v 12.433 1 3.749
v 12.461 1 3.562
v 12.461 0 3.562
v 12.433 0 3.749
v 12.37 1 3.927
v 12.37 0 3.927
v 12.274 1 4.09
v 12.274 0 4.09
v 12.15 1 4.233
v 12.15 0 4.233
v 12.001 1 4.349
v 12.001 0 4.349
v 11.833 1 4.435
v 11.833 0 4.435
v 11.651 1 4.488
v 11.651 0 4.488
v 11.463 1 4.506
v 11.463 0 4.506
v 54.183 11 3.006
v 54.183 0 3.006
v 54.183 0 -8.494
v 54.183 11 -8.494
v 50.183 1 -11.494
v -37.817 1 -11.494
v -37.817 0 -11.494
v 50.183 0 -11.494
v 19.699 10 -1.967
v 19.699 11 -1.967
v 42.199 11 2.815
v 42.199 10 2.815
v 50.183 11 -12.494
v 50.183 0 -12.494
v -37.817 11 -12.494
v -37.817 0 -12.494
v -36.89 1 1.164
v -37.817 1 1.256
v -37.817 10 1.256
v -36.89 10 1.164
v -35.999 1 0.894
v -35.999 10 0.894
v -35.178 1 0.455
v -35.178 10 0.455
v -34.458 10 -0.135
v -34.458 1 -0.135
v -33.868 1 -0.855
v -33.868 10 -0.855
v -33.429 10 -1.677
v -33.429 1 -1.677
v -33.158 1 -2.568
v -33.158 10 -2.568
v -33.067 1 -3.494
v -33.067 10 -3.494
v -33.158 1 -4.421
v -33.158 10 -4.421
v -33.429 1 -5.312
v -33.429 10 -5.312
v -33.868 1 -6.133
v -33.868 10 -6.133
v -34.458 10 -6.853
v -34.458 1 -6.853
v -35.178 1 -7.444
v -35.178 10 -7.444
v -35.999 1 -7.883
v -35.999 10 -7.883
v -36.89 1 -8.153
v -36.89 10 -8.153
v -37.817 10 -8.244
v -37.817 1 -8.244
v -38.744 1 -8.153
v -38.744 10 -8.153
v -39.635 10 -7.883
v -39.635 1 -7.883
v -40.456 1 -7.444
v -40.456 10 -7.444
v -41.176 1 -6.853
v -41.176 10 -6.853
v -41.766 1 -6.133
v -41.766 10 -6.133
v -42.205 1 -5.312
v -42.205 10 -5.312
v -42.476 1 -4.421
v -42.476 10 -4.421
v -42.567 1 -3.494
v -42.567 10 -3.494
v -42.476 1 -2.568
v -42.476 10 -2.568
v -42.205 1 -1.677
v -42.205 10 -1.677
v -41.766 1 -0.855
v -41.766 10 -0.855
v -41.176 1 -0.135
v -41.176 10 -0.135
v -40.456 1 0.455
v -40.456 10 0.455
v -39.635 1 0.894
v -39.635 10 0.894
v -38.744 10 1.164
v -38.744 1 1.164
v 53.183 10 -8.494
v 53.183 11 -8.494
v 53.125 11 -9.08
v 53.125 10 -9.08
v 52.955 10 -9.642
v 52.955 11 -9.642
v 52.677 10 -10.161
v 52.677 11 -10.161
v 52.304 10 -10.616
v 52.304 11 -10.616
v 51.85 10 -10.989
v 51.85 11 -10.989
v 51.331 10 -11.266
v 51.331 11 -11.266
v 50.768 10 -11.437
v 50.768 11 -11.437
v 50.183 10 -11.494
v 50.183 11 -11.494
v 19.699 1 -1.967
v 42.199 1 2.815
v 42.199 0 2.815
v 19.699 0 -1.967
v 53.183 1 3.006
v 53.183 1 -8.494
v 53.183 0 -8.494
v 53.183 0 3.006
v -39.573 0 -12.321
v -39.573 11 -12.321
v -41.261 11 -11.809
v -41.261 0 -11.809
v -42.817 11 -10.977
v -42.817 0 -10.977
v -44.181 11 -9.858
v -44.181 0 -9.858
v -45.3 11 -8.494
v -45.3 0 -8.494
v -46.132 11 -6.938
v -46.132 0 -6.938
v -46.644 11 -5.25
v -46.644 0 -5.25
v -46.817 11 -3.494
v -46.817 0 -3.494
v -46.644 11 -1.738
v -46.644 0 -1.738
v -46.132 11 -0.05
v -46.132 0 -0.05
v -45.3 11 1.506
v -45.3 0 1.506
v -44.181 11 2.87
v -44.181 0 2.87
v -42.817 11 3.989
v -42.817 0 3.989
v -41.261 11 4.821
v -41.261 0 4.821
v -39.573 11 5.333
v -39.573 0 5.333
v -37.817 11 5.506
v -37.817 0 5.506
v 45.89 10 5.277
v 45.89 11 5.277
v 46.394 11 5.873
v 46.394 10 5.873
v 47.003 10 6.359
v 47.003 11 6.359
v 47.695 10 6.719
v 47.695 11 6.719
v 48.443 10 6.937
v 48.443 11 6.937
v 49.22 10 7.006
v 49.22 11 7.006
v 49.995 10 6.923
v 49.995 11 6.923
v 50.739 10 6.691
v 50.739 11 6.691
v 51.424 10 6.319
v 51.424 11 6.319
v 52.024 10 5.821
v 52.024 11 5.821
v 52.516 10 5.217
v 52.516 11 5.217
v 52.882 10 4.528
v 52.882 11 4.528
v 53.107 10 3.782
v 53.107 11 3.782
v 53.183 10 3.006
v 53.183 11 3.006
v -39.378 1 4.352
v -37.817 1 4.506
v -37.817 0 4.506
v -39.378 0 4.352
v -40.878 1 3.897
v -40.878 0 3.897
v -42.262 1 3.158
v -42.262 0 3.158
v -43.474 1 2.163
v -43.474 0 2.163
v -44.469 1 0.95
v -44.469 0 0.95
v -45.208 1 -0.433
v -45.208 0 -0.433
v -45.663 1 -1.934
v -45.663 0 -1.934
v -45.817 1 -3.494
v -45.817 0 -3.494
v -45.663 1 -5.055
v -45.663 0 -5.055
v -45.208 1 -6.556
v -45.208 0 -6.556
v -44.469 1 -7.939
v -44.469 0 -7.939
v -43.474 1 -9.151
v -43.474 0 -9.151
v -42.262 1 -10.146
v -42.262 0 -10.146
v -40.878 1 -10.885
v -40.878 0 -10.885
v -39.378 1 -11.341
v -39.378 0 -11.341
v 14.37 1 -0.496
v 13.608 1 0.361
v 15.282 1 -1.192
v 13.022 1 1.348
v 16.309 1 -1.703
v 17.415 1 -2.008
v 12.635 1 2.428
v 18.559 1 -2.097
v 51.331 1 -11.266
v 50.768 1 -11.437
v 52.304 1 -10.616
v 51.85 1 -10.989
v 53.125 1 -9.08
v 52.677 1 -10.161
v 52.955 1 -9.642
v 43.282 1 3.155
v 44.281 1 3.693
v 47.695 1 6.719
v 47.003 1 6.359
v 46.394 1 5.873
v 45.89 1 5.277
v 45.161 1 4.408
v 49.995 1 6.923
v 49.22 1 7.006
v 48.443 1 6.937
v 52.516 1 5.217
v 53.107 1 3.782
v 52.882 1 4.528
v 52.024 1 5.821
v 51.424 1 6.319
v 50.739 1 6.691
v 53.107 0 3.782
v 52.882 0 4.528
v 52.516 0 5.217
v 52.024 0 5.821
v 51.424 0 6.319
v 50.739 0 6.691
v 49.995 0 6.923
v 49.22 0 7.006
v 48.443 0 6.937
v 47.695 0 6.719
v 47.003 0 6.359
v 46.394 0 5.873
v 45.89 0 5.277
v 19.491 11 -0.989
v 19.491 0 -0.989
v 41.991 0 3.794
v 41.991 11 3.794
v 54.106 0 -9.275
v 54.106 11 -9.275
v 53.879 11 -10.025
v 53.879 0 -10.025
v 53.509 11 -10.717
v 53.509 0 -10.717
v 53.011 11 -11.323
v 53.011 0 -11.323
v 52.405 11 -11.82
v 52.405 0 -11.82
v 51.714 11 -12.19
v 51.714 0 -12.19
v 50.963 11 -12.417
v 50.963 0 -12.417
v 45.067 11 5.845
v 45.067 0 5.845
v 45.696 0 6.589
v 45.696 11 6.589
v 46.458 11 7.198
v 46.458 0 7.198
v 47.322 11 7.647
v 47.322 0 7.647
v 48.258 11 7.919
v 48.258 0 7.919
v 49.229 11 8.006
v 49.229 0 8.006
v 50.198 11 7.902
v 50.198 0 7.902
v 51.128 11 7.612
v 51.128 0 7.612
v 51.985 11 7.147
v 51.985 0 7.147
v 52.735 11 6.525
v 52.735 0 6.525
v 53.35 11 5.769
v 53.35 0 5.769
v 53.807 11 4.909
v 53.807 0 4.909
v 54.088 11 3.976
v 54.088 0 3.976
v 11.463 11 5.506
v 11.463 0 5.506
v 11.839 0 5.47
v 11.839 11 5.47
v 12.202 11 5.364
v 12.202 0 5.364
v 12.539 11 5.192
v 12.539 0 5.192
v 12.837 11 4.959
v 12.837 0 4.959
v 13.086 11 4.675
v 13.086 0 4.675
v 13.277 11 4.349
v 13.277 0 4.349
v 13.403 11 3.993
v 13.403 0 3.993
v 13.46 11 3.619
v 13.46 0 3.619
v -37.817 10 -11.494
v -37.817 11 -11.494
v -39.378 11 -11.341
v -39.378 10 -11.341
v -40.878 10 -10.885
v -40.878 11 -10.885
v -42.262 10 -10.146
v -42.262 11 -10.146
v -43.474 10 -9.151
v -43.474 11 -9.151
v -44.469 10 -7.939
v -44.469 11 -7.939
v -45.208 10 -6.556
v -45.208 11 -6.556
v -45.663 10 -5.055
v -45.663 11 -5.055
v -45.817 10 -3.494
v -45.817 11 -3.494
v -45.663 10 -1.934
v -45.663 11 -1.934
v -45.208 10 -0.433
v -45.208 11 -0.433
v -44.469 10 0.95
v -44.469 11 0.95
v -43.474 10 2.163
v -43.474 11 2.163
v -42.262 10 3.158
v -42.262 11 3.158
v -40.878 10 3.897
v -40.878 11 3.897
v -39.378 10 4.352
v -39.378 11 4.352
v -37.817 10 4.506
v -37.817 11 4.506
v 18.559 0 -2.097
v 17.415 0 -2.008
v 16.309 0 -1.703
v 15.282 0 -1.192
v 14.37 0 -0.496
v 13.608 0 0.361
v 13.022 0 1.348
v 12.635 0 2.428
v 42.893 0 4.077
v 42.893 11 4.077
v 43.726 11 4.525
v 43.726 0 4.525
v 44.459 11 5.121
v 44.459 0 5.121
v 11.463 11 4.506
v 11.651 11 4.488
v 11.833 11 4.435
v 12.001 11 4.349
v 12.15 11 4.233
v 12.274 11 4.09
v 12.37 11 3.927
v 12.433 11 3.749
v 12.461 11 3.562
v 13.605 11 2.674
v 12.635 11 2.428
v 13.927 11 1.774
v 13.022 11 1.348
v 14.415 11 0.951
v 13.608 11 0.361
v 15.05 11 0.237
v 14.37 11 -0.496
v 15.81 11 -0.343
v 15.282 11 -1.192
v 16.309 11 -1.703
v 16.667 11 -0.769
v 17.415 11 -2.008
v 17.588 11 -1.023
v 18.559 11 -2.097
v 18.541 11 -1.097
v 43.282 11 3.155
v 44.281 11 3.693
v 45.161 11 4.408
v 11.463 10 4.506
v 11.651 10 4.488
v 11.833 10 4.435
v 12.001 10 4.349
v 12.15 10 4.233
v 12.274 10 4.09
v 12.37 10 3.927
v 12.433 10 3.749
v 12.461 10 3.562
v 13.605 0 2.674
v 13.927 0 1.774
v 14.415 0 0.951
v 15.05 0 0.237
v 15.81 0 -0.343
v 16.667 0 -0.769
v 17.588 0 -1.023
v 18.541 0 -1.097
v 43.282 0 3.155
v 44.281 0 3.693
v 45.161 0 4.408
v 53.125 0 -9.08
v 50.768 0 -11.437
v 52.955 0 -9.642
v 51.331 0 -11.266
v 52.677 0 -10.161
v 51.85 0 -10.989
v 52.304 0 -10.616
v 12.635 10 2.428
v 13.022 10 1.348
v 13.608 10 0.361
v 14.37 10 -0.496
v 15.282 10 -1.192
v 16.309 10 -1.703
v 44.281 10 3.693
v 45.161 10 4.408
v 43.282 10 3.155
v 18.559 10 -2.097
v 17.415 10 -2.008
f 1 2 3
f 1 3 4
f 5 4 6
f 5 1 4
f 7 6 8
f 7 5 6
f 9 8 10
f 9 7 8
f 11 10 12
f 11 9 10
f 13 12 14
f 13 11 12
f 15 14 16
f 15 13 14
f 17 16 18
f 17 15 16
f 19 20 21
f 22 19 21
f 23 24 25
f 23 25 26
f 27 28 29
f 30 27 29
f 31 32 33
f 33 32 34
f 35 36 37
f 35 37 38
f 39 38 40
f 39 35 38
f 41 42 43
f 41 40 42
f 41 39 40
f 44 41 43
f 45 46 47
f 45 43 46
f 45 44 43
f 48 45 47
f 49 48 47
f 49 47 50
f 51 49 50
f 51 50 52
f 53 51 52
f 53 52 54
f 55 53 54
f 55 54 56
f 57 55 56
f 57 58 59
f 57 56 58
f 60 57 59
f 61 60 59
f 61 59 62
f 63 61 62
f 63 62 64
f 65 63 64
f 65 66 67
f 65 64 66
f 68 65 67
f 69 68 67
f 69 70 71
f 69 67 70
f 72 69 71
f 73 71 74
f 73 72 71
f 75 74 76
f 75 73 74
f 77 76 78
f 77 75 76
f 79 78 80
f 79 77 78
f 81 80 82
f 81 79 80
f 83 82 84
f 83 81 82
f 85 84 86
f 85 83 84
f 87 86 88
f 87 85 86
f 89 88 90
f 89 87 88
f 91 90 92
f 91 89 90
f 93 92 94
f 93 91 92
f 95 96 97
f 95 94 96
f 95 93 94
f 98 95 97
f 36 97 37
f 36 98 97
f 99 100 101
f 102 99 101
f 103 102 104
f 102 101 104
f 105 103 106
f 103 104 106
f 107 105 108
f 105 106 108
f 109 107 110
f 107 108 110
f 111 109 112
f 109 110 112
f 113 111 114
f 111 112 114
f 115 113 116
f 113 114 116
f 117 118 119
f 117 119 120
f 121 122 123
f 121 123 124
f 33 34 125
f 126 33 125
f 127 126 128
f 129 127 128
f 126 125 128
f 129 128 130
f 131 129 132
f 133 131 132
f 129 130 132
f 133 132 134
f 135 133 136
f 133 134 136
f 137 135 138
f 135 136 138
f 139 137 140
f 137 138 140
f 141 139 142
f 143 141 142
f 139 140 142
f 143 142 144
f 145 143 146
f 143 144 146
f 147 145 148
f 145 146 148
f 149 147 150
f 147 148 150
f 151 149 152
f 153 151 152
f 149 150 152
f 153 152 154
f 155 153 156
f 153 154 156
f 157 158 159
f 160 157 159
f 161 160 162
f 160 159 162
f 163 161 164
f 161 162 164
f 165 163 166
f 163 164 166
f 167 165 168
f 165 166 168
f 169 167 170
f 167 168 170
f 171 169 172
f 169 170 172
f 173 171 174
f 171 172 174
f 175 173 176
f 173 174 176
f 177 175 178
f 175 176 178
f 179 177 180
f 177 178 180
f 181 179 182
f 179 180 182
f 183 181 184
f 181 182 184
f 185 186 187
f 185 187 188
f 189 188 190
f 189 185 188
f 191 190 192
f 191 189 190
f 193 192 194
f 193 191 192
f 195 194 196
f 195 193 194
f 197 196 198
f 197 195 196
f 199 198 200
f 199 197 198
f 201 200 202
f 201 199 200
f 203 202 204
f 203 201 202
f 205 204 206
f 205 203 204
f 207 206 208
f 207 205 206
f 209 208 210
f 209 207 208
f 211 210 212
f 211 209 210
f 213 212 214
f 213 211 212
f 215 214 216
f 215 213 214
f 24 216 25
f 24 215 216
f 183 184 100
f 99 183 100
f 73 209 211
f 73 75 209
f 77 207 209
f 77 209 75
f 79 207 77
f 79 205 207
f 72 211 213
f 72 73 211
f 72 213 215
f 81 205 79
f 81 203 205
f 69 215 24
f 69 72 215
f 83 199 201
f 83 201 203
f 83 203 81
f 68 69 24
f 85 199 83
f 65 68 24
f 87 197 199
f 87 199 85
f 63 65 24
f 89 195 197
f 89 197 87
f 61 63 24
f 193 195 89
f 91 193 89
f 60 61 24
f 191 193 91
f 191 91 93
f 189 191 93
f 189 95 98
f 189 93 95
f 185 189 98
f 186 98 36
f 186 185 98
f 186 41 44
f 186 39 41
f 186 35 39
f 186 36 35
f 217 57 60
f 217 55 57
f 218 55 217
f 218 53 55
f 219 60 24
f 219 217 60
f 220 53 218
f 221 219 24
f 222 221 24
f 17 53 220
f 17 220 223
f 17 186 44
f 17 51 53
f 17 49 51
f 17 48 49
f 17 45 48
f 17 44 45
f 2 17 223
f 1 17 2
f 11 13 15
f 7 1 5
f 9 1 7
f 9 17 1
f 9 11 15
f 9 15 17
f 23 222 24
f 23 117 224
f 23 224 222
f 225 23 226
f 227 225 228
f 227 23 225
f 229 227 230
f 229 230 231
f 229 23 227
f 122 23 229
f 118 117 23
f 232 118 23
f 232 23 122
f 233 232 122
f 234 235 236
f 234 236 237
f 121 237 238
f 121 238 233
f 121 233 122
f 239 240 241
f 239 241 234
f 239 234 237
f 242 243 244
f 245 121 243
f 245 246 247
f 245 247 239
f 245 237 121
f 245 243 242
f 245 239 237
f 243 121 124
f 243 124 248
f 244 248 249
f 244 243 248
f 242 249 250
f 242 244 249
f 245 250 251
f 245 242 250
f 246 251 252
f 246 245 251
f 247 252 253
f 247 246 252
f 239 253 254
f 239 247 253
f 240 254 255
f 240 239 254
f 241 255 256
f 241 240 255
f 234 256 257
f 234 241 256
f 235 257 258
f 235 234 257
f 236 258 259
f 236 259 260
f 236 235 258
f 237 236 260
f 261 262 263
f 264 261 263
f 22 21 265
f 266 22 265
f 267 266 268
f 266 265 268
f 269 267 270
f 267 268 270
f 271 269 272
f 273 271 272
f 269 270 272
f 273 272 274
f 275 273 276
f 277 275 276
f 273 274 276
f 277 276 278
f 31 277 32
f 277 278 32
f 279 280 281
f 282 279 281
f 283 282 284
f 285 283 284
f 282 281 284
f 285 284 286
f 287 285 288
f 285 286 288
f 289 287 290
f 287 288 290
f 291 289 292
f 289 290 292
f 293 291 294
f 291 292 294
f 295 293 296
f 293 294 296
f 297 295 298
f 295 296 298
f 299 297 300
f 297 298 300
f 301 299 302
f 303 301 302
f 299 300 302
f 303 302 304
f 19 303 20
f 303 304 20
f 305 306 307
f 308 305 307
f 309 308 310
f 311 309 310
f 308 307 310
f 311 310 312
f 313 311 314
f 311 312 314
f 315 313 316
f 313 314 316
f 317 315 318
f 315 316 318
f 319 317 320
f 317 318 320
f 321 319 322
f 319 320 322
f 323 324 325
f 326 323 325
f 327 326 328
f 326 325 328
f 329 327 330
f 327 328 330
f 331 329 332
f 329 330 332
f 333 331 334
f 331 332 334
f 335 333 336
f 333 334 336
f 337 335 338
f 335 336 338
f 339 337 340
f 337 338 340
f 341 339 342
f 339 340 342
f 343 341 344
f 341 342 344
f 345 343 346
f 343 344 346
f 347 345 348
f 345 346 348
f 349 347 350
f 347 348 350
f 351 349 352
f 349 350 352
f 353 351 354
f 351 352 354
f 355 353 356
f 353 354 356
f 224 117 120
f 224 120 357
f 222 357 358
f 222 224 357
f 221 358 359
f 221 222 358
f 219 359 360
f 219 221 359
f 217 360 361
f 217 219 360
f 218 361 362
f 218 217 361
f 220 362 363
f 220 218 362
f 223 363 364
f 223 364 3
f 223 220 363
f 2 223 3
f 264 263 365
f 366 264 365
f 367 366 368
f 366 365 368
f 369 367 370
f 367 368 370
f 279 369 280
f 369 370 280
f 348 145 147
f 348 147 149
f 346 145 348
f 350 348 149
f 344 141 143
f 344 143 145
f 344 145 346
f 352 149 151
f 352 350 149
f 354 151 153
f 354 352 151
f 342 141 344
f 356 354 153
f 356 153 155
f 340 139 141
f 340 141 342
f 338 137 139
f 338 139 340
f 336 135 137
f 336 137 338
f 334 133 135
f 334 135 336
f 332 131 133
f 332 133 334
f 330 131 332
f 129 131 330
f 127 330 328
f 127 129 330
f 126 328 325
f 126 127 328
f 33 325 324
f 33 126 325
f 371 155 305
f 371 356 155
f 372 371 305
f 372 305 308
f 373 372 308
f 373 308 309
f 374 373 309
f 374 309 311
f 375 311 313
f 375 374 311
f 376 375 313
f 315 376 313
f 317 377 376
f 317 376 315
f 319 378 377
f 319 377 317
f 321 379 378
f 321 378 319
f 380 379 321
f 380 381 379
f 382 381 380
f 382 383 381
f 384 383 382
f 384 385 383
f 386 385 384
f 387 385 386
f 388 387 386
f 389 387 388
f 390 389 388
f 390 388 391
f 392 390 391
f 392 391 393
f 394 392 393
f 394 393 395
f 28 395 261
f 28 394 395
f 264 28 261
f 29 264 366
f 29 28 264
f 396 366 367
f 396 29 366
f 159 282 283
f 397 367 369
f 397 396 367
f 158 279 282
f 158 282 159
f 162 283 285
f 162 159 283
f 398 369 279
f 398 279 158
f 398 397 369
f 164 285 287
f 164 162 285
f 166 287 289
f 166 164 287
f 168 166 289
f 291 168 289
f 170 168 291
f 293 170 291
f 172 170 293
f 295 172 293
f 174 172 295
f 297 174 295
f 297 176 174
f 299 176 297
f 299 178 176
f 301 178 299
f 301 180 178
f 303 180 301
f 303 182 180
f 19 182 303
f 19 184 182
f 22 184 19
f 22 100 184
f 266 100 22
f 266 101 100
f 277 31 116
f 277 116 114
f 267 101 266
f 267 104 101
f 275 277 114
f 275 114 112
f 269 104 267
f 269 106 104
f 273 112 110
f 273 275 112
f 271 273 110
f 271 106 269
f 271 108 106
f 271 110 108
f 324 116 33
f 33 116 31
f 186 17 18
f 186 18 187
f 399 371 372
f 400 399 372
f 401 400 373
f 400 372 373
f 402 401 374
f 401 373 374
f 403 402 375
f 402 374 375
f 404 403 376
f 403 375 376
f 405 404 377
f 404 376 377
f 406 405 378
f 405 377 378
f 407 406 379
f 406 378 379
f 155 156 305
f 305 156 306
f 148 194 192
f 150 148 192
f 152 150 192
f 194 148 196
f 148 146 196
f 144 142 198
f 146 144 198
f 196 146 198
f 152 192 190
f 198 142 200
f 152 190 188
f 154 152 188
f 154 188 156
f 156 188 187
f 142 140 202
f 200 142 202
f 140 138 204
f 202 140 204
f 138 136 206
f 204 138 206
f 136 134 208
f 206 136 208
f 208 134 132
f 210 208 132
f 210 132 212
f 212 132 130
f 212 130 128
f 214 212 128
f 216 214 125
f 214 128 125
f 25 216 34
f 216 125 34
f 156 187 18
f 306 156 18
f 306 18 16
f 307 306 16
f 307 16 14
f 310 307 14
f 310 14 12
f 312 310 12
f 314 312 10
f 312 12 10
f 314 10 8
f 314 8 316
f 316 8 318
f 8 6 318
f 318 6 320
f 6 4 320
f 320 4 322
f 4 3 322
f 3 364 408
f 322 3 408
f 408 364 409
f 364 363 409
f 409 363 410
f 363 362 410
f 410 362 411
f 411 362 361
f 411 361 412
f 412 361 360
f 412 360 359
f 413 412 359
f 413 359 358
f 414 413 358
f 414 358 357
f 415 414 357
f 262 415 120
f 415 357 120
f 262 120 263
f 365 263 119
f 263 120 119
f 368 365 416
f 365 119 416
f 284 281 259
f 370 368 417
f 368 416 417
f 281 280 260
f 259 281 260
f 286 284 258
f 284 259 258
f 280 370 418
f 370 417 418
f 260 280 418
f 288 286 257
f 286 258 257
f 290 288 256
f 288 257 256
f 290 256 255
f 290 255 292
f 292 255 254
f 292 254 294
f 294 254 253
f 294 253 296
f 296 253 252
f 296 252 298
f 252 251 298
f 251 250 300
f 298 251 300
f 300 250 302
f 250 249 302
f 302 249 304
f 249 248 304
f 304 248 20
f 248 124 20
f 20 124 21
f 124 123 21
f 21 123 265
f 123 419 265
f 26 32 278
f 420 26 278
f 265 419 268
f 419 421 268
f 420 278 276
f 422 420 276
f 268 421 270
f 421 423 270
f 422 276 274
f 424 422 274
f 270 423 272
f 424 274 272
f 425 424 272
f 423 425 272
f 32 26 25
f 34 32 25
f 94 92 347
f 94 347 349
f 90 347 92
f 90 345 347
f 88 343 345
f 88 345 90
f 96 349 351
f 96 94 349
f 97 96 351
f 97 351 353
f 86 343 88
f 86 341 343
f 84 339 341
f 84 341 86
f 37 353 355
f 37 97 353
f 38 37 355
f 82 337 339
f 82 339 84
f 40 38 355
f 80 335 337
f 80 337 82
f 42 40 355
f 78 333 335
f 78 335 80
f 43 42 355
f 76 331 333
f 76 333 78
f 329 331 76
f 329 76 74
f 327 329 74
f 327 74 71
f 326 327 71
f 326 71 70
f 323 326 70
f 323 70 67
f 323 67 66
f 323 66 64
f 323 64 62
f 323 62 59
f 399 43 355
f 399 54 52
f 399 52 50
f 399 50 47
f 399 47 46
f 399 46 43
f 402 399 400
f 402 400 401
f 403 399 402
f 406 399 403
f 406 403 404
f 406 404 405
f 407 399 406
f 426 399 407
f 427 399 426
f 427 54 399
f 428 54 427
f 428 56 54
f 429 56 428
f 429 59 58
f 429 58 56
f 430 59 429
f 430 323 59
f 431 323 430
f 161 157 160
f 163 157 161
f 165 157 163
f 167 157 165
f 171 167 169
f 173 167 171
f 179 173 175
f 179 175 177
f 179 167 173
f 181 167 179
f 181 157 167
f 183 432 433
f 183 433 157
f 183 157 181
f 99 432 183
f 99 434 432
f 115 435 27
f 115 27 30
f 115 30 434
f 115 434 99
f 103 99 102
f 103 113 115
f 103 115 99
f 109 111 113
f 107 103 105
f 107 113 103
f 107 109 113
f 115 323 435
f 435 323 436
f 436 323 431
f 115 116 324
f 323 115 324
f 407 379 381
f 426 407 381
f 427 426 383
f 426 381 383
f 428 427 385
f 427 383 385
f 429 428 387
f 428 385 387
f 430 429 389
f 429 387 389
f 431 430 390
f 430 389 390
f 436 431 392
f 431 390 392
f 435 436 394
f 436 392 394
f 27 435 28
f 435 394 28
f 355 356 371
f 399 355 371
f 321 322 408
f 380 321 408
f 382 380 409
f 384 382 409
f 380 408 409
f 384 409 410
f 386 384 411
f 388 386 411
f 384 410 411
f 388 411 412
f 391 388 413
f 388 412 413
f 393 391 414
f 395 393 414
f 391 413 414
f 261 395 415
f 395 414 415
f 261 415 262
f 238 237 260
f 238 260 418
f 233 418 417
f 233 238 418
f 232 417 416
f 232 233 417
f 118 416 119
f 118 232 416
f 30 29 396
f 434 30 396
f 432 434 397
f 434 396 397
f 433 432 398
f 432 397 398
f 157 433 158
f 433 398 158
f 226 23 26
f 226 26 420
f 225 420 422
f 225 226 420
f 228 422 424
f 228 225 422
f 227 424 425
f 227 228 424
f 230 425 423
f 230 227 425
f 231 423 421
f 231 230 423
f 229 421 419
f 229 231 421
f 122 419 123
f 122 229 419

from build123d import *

# Parameters (mm, degrees)
SKETCH1_R           = 4.75
BOSS_EXTRUDE1_DEPTH = 11
CUT_EXTRUDE1_DEPTH  = 1
CUT_EXTRUDE2_START  = -1
CUT_EXTRUDE2_DEPTH  = 1


with BuildPart() as part:
    # Sketch1 → Boss-Extrude1 (new body)
    with BuildSketch(Plane(origin=(0, 0, 0), x_dir=(1, 0, 0), z_dir=(0, 1, 0))):
        with BuildLine():
            Line((19.491292084, 0.988927265), (41.991292084, -3.793595372))
            ThreePointArc((41.991292084, -3.793595372), (43.725917616, -4.524537322), (45.067363393, -5.845039159))
            ThreePointArc((45.067363393, -5.845039159), (50.669911309, -7.779535303), (54.182993157, -3.005744942))
            Line((54.182993157, -3.005744942), (54.182993157, 8.494255058))
            ThreePointArc((54.182993157, 8.494255058), (53.011420282, 11.322682182), (50.182993157, 12.494255058))
            Line((50.182993157, 12.494255058), (-37.817006843, 12.494255058))
            ThreePointArc((-37.817006843, 12.494255058), (-46.817006843, 3.494255058), (-37.817006843, -5.505744942))
            Line((-37.817006843, -5.505744942), (11.462947477, -5.505744942))
            ThreePointArc((11.462947477, -5.505744942), (12.836569821, -4.959416727), (13.459743521, -3.618906598))
            ThreePointArc((13.459743521, -3.618906598), (15.416365081, 0.071416888), (19.491292084, 0.988927265))
        make_face()
        with Locations(Location((-37.817006843, 3.494255058, 0), (0, 0, 270))):
            Circle(SKETCH1_R, mode=Mode.SUBTRACT)
    extrude(amount=BOSS_EXTRUDE1_DEPTH)

    # Sketch2 → Cut-Extrude1 (cut)
    with BuildSketch(Plane(origin=(0, 11, 0), x_dir=(1, 0, 0), z_dir=(0, 1, 0))):
        with BuildLine():
            Line((50.182993157, 11.494255058), (-37.817006843, 11.494255058))
            ThreePointArc((-37.817006843, 11.494255058), (-45.817006843, 3.494255058), (-37.817006843, -4.505744942))
            Line((-37.817006843, -4.505744942), (11.462947477, -4.505744942))
            ThreePointArc((11.462947477, -4.505744942), (12.149758649, -4.232580835), (12.461345499, -3.56232577))
            ThreePointArc((12.461345499, -3.56232577), (14.809291371, 0.866062414), (19.699203775, 1.967074866))
            Line((19.699203775, 1.967074866), (42.199203775, -2.815447772))
            ThreePointArc((42.199203775, -2.815447772), (44.280754414, -3.692578112), (45.890489346, -5.277180316))
            ThreePointArc((45.890489346, -5.277180316), (50.372527679, -6.824777231), (53.182993157, -3.005744942))
            Line((53.182993157, -3.005744942), (53.182993157, 8.494255058))
            ThreePointArc((53.182993157, 8.494255058), (52.3043135, 10.615575401), (50.182993157, 11.494255058))
        make_face()
    extrude(amount=-CUT_EXTRUDE1_DEPTH, mode=Mode.SUBTRACT)

    # Sketch3 → Cut-Extrude2 (cut)
    with BuildSketch(Plane.XZ.offset(CUT_EXTRUDE2_START)):
        with BuildLine():
            Line((11.462947477, 4.505744942), (-37.817006843, 4.505744942))
            ThreePointArc((-37.817006843, 4.505744942), (-45.817006843, -3.494255058), (-37.817006843, -11.494255058))
            Line((-37.817006843, -11.494255058), (50.182993157, -11.494255058))
            ThreePointArc((50.182993157, -11.494255058), (52.3043135, -10.615575401), (53.182993157, -8.494255058))
            Line((53.182993157, -8.494255058), (53.182993157, 3.005744942))
            ThreePointArc((53.182993157, 3.005744942), (50.372527679, 6.824777231), (45.890489346, 5.277180316))
            ThreePointArc((45.890489346, 5.277180316), (44.280754414, 3.692578112), (42.199203775, 2.815447772))
            Line((42.199203775, 2.815447772), (19.699203775, -1.967074866))
            ThreePointArc((19.699203775, -1.967074866), (14.809291371, -0.866062414), (12.461345499, 3.56232577))
            ThreePointArc((12.461345499, 3.56232577), (12.149758649, 4.232580835), (11.462947477, 4.505744942))
        make_face()
    extrude(amount=CUT_EXTRUDE2_DEPTH, mode=Mode.SUBTRACT)


solid = part.part
